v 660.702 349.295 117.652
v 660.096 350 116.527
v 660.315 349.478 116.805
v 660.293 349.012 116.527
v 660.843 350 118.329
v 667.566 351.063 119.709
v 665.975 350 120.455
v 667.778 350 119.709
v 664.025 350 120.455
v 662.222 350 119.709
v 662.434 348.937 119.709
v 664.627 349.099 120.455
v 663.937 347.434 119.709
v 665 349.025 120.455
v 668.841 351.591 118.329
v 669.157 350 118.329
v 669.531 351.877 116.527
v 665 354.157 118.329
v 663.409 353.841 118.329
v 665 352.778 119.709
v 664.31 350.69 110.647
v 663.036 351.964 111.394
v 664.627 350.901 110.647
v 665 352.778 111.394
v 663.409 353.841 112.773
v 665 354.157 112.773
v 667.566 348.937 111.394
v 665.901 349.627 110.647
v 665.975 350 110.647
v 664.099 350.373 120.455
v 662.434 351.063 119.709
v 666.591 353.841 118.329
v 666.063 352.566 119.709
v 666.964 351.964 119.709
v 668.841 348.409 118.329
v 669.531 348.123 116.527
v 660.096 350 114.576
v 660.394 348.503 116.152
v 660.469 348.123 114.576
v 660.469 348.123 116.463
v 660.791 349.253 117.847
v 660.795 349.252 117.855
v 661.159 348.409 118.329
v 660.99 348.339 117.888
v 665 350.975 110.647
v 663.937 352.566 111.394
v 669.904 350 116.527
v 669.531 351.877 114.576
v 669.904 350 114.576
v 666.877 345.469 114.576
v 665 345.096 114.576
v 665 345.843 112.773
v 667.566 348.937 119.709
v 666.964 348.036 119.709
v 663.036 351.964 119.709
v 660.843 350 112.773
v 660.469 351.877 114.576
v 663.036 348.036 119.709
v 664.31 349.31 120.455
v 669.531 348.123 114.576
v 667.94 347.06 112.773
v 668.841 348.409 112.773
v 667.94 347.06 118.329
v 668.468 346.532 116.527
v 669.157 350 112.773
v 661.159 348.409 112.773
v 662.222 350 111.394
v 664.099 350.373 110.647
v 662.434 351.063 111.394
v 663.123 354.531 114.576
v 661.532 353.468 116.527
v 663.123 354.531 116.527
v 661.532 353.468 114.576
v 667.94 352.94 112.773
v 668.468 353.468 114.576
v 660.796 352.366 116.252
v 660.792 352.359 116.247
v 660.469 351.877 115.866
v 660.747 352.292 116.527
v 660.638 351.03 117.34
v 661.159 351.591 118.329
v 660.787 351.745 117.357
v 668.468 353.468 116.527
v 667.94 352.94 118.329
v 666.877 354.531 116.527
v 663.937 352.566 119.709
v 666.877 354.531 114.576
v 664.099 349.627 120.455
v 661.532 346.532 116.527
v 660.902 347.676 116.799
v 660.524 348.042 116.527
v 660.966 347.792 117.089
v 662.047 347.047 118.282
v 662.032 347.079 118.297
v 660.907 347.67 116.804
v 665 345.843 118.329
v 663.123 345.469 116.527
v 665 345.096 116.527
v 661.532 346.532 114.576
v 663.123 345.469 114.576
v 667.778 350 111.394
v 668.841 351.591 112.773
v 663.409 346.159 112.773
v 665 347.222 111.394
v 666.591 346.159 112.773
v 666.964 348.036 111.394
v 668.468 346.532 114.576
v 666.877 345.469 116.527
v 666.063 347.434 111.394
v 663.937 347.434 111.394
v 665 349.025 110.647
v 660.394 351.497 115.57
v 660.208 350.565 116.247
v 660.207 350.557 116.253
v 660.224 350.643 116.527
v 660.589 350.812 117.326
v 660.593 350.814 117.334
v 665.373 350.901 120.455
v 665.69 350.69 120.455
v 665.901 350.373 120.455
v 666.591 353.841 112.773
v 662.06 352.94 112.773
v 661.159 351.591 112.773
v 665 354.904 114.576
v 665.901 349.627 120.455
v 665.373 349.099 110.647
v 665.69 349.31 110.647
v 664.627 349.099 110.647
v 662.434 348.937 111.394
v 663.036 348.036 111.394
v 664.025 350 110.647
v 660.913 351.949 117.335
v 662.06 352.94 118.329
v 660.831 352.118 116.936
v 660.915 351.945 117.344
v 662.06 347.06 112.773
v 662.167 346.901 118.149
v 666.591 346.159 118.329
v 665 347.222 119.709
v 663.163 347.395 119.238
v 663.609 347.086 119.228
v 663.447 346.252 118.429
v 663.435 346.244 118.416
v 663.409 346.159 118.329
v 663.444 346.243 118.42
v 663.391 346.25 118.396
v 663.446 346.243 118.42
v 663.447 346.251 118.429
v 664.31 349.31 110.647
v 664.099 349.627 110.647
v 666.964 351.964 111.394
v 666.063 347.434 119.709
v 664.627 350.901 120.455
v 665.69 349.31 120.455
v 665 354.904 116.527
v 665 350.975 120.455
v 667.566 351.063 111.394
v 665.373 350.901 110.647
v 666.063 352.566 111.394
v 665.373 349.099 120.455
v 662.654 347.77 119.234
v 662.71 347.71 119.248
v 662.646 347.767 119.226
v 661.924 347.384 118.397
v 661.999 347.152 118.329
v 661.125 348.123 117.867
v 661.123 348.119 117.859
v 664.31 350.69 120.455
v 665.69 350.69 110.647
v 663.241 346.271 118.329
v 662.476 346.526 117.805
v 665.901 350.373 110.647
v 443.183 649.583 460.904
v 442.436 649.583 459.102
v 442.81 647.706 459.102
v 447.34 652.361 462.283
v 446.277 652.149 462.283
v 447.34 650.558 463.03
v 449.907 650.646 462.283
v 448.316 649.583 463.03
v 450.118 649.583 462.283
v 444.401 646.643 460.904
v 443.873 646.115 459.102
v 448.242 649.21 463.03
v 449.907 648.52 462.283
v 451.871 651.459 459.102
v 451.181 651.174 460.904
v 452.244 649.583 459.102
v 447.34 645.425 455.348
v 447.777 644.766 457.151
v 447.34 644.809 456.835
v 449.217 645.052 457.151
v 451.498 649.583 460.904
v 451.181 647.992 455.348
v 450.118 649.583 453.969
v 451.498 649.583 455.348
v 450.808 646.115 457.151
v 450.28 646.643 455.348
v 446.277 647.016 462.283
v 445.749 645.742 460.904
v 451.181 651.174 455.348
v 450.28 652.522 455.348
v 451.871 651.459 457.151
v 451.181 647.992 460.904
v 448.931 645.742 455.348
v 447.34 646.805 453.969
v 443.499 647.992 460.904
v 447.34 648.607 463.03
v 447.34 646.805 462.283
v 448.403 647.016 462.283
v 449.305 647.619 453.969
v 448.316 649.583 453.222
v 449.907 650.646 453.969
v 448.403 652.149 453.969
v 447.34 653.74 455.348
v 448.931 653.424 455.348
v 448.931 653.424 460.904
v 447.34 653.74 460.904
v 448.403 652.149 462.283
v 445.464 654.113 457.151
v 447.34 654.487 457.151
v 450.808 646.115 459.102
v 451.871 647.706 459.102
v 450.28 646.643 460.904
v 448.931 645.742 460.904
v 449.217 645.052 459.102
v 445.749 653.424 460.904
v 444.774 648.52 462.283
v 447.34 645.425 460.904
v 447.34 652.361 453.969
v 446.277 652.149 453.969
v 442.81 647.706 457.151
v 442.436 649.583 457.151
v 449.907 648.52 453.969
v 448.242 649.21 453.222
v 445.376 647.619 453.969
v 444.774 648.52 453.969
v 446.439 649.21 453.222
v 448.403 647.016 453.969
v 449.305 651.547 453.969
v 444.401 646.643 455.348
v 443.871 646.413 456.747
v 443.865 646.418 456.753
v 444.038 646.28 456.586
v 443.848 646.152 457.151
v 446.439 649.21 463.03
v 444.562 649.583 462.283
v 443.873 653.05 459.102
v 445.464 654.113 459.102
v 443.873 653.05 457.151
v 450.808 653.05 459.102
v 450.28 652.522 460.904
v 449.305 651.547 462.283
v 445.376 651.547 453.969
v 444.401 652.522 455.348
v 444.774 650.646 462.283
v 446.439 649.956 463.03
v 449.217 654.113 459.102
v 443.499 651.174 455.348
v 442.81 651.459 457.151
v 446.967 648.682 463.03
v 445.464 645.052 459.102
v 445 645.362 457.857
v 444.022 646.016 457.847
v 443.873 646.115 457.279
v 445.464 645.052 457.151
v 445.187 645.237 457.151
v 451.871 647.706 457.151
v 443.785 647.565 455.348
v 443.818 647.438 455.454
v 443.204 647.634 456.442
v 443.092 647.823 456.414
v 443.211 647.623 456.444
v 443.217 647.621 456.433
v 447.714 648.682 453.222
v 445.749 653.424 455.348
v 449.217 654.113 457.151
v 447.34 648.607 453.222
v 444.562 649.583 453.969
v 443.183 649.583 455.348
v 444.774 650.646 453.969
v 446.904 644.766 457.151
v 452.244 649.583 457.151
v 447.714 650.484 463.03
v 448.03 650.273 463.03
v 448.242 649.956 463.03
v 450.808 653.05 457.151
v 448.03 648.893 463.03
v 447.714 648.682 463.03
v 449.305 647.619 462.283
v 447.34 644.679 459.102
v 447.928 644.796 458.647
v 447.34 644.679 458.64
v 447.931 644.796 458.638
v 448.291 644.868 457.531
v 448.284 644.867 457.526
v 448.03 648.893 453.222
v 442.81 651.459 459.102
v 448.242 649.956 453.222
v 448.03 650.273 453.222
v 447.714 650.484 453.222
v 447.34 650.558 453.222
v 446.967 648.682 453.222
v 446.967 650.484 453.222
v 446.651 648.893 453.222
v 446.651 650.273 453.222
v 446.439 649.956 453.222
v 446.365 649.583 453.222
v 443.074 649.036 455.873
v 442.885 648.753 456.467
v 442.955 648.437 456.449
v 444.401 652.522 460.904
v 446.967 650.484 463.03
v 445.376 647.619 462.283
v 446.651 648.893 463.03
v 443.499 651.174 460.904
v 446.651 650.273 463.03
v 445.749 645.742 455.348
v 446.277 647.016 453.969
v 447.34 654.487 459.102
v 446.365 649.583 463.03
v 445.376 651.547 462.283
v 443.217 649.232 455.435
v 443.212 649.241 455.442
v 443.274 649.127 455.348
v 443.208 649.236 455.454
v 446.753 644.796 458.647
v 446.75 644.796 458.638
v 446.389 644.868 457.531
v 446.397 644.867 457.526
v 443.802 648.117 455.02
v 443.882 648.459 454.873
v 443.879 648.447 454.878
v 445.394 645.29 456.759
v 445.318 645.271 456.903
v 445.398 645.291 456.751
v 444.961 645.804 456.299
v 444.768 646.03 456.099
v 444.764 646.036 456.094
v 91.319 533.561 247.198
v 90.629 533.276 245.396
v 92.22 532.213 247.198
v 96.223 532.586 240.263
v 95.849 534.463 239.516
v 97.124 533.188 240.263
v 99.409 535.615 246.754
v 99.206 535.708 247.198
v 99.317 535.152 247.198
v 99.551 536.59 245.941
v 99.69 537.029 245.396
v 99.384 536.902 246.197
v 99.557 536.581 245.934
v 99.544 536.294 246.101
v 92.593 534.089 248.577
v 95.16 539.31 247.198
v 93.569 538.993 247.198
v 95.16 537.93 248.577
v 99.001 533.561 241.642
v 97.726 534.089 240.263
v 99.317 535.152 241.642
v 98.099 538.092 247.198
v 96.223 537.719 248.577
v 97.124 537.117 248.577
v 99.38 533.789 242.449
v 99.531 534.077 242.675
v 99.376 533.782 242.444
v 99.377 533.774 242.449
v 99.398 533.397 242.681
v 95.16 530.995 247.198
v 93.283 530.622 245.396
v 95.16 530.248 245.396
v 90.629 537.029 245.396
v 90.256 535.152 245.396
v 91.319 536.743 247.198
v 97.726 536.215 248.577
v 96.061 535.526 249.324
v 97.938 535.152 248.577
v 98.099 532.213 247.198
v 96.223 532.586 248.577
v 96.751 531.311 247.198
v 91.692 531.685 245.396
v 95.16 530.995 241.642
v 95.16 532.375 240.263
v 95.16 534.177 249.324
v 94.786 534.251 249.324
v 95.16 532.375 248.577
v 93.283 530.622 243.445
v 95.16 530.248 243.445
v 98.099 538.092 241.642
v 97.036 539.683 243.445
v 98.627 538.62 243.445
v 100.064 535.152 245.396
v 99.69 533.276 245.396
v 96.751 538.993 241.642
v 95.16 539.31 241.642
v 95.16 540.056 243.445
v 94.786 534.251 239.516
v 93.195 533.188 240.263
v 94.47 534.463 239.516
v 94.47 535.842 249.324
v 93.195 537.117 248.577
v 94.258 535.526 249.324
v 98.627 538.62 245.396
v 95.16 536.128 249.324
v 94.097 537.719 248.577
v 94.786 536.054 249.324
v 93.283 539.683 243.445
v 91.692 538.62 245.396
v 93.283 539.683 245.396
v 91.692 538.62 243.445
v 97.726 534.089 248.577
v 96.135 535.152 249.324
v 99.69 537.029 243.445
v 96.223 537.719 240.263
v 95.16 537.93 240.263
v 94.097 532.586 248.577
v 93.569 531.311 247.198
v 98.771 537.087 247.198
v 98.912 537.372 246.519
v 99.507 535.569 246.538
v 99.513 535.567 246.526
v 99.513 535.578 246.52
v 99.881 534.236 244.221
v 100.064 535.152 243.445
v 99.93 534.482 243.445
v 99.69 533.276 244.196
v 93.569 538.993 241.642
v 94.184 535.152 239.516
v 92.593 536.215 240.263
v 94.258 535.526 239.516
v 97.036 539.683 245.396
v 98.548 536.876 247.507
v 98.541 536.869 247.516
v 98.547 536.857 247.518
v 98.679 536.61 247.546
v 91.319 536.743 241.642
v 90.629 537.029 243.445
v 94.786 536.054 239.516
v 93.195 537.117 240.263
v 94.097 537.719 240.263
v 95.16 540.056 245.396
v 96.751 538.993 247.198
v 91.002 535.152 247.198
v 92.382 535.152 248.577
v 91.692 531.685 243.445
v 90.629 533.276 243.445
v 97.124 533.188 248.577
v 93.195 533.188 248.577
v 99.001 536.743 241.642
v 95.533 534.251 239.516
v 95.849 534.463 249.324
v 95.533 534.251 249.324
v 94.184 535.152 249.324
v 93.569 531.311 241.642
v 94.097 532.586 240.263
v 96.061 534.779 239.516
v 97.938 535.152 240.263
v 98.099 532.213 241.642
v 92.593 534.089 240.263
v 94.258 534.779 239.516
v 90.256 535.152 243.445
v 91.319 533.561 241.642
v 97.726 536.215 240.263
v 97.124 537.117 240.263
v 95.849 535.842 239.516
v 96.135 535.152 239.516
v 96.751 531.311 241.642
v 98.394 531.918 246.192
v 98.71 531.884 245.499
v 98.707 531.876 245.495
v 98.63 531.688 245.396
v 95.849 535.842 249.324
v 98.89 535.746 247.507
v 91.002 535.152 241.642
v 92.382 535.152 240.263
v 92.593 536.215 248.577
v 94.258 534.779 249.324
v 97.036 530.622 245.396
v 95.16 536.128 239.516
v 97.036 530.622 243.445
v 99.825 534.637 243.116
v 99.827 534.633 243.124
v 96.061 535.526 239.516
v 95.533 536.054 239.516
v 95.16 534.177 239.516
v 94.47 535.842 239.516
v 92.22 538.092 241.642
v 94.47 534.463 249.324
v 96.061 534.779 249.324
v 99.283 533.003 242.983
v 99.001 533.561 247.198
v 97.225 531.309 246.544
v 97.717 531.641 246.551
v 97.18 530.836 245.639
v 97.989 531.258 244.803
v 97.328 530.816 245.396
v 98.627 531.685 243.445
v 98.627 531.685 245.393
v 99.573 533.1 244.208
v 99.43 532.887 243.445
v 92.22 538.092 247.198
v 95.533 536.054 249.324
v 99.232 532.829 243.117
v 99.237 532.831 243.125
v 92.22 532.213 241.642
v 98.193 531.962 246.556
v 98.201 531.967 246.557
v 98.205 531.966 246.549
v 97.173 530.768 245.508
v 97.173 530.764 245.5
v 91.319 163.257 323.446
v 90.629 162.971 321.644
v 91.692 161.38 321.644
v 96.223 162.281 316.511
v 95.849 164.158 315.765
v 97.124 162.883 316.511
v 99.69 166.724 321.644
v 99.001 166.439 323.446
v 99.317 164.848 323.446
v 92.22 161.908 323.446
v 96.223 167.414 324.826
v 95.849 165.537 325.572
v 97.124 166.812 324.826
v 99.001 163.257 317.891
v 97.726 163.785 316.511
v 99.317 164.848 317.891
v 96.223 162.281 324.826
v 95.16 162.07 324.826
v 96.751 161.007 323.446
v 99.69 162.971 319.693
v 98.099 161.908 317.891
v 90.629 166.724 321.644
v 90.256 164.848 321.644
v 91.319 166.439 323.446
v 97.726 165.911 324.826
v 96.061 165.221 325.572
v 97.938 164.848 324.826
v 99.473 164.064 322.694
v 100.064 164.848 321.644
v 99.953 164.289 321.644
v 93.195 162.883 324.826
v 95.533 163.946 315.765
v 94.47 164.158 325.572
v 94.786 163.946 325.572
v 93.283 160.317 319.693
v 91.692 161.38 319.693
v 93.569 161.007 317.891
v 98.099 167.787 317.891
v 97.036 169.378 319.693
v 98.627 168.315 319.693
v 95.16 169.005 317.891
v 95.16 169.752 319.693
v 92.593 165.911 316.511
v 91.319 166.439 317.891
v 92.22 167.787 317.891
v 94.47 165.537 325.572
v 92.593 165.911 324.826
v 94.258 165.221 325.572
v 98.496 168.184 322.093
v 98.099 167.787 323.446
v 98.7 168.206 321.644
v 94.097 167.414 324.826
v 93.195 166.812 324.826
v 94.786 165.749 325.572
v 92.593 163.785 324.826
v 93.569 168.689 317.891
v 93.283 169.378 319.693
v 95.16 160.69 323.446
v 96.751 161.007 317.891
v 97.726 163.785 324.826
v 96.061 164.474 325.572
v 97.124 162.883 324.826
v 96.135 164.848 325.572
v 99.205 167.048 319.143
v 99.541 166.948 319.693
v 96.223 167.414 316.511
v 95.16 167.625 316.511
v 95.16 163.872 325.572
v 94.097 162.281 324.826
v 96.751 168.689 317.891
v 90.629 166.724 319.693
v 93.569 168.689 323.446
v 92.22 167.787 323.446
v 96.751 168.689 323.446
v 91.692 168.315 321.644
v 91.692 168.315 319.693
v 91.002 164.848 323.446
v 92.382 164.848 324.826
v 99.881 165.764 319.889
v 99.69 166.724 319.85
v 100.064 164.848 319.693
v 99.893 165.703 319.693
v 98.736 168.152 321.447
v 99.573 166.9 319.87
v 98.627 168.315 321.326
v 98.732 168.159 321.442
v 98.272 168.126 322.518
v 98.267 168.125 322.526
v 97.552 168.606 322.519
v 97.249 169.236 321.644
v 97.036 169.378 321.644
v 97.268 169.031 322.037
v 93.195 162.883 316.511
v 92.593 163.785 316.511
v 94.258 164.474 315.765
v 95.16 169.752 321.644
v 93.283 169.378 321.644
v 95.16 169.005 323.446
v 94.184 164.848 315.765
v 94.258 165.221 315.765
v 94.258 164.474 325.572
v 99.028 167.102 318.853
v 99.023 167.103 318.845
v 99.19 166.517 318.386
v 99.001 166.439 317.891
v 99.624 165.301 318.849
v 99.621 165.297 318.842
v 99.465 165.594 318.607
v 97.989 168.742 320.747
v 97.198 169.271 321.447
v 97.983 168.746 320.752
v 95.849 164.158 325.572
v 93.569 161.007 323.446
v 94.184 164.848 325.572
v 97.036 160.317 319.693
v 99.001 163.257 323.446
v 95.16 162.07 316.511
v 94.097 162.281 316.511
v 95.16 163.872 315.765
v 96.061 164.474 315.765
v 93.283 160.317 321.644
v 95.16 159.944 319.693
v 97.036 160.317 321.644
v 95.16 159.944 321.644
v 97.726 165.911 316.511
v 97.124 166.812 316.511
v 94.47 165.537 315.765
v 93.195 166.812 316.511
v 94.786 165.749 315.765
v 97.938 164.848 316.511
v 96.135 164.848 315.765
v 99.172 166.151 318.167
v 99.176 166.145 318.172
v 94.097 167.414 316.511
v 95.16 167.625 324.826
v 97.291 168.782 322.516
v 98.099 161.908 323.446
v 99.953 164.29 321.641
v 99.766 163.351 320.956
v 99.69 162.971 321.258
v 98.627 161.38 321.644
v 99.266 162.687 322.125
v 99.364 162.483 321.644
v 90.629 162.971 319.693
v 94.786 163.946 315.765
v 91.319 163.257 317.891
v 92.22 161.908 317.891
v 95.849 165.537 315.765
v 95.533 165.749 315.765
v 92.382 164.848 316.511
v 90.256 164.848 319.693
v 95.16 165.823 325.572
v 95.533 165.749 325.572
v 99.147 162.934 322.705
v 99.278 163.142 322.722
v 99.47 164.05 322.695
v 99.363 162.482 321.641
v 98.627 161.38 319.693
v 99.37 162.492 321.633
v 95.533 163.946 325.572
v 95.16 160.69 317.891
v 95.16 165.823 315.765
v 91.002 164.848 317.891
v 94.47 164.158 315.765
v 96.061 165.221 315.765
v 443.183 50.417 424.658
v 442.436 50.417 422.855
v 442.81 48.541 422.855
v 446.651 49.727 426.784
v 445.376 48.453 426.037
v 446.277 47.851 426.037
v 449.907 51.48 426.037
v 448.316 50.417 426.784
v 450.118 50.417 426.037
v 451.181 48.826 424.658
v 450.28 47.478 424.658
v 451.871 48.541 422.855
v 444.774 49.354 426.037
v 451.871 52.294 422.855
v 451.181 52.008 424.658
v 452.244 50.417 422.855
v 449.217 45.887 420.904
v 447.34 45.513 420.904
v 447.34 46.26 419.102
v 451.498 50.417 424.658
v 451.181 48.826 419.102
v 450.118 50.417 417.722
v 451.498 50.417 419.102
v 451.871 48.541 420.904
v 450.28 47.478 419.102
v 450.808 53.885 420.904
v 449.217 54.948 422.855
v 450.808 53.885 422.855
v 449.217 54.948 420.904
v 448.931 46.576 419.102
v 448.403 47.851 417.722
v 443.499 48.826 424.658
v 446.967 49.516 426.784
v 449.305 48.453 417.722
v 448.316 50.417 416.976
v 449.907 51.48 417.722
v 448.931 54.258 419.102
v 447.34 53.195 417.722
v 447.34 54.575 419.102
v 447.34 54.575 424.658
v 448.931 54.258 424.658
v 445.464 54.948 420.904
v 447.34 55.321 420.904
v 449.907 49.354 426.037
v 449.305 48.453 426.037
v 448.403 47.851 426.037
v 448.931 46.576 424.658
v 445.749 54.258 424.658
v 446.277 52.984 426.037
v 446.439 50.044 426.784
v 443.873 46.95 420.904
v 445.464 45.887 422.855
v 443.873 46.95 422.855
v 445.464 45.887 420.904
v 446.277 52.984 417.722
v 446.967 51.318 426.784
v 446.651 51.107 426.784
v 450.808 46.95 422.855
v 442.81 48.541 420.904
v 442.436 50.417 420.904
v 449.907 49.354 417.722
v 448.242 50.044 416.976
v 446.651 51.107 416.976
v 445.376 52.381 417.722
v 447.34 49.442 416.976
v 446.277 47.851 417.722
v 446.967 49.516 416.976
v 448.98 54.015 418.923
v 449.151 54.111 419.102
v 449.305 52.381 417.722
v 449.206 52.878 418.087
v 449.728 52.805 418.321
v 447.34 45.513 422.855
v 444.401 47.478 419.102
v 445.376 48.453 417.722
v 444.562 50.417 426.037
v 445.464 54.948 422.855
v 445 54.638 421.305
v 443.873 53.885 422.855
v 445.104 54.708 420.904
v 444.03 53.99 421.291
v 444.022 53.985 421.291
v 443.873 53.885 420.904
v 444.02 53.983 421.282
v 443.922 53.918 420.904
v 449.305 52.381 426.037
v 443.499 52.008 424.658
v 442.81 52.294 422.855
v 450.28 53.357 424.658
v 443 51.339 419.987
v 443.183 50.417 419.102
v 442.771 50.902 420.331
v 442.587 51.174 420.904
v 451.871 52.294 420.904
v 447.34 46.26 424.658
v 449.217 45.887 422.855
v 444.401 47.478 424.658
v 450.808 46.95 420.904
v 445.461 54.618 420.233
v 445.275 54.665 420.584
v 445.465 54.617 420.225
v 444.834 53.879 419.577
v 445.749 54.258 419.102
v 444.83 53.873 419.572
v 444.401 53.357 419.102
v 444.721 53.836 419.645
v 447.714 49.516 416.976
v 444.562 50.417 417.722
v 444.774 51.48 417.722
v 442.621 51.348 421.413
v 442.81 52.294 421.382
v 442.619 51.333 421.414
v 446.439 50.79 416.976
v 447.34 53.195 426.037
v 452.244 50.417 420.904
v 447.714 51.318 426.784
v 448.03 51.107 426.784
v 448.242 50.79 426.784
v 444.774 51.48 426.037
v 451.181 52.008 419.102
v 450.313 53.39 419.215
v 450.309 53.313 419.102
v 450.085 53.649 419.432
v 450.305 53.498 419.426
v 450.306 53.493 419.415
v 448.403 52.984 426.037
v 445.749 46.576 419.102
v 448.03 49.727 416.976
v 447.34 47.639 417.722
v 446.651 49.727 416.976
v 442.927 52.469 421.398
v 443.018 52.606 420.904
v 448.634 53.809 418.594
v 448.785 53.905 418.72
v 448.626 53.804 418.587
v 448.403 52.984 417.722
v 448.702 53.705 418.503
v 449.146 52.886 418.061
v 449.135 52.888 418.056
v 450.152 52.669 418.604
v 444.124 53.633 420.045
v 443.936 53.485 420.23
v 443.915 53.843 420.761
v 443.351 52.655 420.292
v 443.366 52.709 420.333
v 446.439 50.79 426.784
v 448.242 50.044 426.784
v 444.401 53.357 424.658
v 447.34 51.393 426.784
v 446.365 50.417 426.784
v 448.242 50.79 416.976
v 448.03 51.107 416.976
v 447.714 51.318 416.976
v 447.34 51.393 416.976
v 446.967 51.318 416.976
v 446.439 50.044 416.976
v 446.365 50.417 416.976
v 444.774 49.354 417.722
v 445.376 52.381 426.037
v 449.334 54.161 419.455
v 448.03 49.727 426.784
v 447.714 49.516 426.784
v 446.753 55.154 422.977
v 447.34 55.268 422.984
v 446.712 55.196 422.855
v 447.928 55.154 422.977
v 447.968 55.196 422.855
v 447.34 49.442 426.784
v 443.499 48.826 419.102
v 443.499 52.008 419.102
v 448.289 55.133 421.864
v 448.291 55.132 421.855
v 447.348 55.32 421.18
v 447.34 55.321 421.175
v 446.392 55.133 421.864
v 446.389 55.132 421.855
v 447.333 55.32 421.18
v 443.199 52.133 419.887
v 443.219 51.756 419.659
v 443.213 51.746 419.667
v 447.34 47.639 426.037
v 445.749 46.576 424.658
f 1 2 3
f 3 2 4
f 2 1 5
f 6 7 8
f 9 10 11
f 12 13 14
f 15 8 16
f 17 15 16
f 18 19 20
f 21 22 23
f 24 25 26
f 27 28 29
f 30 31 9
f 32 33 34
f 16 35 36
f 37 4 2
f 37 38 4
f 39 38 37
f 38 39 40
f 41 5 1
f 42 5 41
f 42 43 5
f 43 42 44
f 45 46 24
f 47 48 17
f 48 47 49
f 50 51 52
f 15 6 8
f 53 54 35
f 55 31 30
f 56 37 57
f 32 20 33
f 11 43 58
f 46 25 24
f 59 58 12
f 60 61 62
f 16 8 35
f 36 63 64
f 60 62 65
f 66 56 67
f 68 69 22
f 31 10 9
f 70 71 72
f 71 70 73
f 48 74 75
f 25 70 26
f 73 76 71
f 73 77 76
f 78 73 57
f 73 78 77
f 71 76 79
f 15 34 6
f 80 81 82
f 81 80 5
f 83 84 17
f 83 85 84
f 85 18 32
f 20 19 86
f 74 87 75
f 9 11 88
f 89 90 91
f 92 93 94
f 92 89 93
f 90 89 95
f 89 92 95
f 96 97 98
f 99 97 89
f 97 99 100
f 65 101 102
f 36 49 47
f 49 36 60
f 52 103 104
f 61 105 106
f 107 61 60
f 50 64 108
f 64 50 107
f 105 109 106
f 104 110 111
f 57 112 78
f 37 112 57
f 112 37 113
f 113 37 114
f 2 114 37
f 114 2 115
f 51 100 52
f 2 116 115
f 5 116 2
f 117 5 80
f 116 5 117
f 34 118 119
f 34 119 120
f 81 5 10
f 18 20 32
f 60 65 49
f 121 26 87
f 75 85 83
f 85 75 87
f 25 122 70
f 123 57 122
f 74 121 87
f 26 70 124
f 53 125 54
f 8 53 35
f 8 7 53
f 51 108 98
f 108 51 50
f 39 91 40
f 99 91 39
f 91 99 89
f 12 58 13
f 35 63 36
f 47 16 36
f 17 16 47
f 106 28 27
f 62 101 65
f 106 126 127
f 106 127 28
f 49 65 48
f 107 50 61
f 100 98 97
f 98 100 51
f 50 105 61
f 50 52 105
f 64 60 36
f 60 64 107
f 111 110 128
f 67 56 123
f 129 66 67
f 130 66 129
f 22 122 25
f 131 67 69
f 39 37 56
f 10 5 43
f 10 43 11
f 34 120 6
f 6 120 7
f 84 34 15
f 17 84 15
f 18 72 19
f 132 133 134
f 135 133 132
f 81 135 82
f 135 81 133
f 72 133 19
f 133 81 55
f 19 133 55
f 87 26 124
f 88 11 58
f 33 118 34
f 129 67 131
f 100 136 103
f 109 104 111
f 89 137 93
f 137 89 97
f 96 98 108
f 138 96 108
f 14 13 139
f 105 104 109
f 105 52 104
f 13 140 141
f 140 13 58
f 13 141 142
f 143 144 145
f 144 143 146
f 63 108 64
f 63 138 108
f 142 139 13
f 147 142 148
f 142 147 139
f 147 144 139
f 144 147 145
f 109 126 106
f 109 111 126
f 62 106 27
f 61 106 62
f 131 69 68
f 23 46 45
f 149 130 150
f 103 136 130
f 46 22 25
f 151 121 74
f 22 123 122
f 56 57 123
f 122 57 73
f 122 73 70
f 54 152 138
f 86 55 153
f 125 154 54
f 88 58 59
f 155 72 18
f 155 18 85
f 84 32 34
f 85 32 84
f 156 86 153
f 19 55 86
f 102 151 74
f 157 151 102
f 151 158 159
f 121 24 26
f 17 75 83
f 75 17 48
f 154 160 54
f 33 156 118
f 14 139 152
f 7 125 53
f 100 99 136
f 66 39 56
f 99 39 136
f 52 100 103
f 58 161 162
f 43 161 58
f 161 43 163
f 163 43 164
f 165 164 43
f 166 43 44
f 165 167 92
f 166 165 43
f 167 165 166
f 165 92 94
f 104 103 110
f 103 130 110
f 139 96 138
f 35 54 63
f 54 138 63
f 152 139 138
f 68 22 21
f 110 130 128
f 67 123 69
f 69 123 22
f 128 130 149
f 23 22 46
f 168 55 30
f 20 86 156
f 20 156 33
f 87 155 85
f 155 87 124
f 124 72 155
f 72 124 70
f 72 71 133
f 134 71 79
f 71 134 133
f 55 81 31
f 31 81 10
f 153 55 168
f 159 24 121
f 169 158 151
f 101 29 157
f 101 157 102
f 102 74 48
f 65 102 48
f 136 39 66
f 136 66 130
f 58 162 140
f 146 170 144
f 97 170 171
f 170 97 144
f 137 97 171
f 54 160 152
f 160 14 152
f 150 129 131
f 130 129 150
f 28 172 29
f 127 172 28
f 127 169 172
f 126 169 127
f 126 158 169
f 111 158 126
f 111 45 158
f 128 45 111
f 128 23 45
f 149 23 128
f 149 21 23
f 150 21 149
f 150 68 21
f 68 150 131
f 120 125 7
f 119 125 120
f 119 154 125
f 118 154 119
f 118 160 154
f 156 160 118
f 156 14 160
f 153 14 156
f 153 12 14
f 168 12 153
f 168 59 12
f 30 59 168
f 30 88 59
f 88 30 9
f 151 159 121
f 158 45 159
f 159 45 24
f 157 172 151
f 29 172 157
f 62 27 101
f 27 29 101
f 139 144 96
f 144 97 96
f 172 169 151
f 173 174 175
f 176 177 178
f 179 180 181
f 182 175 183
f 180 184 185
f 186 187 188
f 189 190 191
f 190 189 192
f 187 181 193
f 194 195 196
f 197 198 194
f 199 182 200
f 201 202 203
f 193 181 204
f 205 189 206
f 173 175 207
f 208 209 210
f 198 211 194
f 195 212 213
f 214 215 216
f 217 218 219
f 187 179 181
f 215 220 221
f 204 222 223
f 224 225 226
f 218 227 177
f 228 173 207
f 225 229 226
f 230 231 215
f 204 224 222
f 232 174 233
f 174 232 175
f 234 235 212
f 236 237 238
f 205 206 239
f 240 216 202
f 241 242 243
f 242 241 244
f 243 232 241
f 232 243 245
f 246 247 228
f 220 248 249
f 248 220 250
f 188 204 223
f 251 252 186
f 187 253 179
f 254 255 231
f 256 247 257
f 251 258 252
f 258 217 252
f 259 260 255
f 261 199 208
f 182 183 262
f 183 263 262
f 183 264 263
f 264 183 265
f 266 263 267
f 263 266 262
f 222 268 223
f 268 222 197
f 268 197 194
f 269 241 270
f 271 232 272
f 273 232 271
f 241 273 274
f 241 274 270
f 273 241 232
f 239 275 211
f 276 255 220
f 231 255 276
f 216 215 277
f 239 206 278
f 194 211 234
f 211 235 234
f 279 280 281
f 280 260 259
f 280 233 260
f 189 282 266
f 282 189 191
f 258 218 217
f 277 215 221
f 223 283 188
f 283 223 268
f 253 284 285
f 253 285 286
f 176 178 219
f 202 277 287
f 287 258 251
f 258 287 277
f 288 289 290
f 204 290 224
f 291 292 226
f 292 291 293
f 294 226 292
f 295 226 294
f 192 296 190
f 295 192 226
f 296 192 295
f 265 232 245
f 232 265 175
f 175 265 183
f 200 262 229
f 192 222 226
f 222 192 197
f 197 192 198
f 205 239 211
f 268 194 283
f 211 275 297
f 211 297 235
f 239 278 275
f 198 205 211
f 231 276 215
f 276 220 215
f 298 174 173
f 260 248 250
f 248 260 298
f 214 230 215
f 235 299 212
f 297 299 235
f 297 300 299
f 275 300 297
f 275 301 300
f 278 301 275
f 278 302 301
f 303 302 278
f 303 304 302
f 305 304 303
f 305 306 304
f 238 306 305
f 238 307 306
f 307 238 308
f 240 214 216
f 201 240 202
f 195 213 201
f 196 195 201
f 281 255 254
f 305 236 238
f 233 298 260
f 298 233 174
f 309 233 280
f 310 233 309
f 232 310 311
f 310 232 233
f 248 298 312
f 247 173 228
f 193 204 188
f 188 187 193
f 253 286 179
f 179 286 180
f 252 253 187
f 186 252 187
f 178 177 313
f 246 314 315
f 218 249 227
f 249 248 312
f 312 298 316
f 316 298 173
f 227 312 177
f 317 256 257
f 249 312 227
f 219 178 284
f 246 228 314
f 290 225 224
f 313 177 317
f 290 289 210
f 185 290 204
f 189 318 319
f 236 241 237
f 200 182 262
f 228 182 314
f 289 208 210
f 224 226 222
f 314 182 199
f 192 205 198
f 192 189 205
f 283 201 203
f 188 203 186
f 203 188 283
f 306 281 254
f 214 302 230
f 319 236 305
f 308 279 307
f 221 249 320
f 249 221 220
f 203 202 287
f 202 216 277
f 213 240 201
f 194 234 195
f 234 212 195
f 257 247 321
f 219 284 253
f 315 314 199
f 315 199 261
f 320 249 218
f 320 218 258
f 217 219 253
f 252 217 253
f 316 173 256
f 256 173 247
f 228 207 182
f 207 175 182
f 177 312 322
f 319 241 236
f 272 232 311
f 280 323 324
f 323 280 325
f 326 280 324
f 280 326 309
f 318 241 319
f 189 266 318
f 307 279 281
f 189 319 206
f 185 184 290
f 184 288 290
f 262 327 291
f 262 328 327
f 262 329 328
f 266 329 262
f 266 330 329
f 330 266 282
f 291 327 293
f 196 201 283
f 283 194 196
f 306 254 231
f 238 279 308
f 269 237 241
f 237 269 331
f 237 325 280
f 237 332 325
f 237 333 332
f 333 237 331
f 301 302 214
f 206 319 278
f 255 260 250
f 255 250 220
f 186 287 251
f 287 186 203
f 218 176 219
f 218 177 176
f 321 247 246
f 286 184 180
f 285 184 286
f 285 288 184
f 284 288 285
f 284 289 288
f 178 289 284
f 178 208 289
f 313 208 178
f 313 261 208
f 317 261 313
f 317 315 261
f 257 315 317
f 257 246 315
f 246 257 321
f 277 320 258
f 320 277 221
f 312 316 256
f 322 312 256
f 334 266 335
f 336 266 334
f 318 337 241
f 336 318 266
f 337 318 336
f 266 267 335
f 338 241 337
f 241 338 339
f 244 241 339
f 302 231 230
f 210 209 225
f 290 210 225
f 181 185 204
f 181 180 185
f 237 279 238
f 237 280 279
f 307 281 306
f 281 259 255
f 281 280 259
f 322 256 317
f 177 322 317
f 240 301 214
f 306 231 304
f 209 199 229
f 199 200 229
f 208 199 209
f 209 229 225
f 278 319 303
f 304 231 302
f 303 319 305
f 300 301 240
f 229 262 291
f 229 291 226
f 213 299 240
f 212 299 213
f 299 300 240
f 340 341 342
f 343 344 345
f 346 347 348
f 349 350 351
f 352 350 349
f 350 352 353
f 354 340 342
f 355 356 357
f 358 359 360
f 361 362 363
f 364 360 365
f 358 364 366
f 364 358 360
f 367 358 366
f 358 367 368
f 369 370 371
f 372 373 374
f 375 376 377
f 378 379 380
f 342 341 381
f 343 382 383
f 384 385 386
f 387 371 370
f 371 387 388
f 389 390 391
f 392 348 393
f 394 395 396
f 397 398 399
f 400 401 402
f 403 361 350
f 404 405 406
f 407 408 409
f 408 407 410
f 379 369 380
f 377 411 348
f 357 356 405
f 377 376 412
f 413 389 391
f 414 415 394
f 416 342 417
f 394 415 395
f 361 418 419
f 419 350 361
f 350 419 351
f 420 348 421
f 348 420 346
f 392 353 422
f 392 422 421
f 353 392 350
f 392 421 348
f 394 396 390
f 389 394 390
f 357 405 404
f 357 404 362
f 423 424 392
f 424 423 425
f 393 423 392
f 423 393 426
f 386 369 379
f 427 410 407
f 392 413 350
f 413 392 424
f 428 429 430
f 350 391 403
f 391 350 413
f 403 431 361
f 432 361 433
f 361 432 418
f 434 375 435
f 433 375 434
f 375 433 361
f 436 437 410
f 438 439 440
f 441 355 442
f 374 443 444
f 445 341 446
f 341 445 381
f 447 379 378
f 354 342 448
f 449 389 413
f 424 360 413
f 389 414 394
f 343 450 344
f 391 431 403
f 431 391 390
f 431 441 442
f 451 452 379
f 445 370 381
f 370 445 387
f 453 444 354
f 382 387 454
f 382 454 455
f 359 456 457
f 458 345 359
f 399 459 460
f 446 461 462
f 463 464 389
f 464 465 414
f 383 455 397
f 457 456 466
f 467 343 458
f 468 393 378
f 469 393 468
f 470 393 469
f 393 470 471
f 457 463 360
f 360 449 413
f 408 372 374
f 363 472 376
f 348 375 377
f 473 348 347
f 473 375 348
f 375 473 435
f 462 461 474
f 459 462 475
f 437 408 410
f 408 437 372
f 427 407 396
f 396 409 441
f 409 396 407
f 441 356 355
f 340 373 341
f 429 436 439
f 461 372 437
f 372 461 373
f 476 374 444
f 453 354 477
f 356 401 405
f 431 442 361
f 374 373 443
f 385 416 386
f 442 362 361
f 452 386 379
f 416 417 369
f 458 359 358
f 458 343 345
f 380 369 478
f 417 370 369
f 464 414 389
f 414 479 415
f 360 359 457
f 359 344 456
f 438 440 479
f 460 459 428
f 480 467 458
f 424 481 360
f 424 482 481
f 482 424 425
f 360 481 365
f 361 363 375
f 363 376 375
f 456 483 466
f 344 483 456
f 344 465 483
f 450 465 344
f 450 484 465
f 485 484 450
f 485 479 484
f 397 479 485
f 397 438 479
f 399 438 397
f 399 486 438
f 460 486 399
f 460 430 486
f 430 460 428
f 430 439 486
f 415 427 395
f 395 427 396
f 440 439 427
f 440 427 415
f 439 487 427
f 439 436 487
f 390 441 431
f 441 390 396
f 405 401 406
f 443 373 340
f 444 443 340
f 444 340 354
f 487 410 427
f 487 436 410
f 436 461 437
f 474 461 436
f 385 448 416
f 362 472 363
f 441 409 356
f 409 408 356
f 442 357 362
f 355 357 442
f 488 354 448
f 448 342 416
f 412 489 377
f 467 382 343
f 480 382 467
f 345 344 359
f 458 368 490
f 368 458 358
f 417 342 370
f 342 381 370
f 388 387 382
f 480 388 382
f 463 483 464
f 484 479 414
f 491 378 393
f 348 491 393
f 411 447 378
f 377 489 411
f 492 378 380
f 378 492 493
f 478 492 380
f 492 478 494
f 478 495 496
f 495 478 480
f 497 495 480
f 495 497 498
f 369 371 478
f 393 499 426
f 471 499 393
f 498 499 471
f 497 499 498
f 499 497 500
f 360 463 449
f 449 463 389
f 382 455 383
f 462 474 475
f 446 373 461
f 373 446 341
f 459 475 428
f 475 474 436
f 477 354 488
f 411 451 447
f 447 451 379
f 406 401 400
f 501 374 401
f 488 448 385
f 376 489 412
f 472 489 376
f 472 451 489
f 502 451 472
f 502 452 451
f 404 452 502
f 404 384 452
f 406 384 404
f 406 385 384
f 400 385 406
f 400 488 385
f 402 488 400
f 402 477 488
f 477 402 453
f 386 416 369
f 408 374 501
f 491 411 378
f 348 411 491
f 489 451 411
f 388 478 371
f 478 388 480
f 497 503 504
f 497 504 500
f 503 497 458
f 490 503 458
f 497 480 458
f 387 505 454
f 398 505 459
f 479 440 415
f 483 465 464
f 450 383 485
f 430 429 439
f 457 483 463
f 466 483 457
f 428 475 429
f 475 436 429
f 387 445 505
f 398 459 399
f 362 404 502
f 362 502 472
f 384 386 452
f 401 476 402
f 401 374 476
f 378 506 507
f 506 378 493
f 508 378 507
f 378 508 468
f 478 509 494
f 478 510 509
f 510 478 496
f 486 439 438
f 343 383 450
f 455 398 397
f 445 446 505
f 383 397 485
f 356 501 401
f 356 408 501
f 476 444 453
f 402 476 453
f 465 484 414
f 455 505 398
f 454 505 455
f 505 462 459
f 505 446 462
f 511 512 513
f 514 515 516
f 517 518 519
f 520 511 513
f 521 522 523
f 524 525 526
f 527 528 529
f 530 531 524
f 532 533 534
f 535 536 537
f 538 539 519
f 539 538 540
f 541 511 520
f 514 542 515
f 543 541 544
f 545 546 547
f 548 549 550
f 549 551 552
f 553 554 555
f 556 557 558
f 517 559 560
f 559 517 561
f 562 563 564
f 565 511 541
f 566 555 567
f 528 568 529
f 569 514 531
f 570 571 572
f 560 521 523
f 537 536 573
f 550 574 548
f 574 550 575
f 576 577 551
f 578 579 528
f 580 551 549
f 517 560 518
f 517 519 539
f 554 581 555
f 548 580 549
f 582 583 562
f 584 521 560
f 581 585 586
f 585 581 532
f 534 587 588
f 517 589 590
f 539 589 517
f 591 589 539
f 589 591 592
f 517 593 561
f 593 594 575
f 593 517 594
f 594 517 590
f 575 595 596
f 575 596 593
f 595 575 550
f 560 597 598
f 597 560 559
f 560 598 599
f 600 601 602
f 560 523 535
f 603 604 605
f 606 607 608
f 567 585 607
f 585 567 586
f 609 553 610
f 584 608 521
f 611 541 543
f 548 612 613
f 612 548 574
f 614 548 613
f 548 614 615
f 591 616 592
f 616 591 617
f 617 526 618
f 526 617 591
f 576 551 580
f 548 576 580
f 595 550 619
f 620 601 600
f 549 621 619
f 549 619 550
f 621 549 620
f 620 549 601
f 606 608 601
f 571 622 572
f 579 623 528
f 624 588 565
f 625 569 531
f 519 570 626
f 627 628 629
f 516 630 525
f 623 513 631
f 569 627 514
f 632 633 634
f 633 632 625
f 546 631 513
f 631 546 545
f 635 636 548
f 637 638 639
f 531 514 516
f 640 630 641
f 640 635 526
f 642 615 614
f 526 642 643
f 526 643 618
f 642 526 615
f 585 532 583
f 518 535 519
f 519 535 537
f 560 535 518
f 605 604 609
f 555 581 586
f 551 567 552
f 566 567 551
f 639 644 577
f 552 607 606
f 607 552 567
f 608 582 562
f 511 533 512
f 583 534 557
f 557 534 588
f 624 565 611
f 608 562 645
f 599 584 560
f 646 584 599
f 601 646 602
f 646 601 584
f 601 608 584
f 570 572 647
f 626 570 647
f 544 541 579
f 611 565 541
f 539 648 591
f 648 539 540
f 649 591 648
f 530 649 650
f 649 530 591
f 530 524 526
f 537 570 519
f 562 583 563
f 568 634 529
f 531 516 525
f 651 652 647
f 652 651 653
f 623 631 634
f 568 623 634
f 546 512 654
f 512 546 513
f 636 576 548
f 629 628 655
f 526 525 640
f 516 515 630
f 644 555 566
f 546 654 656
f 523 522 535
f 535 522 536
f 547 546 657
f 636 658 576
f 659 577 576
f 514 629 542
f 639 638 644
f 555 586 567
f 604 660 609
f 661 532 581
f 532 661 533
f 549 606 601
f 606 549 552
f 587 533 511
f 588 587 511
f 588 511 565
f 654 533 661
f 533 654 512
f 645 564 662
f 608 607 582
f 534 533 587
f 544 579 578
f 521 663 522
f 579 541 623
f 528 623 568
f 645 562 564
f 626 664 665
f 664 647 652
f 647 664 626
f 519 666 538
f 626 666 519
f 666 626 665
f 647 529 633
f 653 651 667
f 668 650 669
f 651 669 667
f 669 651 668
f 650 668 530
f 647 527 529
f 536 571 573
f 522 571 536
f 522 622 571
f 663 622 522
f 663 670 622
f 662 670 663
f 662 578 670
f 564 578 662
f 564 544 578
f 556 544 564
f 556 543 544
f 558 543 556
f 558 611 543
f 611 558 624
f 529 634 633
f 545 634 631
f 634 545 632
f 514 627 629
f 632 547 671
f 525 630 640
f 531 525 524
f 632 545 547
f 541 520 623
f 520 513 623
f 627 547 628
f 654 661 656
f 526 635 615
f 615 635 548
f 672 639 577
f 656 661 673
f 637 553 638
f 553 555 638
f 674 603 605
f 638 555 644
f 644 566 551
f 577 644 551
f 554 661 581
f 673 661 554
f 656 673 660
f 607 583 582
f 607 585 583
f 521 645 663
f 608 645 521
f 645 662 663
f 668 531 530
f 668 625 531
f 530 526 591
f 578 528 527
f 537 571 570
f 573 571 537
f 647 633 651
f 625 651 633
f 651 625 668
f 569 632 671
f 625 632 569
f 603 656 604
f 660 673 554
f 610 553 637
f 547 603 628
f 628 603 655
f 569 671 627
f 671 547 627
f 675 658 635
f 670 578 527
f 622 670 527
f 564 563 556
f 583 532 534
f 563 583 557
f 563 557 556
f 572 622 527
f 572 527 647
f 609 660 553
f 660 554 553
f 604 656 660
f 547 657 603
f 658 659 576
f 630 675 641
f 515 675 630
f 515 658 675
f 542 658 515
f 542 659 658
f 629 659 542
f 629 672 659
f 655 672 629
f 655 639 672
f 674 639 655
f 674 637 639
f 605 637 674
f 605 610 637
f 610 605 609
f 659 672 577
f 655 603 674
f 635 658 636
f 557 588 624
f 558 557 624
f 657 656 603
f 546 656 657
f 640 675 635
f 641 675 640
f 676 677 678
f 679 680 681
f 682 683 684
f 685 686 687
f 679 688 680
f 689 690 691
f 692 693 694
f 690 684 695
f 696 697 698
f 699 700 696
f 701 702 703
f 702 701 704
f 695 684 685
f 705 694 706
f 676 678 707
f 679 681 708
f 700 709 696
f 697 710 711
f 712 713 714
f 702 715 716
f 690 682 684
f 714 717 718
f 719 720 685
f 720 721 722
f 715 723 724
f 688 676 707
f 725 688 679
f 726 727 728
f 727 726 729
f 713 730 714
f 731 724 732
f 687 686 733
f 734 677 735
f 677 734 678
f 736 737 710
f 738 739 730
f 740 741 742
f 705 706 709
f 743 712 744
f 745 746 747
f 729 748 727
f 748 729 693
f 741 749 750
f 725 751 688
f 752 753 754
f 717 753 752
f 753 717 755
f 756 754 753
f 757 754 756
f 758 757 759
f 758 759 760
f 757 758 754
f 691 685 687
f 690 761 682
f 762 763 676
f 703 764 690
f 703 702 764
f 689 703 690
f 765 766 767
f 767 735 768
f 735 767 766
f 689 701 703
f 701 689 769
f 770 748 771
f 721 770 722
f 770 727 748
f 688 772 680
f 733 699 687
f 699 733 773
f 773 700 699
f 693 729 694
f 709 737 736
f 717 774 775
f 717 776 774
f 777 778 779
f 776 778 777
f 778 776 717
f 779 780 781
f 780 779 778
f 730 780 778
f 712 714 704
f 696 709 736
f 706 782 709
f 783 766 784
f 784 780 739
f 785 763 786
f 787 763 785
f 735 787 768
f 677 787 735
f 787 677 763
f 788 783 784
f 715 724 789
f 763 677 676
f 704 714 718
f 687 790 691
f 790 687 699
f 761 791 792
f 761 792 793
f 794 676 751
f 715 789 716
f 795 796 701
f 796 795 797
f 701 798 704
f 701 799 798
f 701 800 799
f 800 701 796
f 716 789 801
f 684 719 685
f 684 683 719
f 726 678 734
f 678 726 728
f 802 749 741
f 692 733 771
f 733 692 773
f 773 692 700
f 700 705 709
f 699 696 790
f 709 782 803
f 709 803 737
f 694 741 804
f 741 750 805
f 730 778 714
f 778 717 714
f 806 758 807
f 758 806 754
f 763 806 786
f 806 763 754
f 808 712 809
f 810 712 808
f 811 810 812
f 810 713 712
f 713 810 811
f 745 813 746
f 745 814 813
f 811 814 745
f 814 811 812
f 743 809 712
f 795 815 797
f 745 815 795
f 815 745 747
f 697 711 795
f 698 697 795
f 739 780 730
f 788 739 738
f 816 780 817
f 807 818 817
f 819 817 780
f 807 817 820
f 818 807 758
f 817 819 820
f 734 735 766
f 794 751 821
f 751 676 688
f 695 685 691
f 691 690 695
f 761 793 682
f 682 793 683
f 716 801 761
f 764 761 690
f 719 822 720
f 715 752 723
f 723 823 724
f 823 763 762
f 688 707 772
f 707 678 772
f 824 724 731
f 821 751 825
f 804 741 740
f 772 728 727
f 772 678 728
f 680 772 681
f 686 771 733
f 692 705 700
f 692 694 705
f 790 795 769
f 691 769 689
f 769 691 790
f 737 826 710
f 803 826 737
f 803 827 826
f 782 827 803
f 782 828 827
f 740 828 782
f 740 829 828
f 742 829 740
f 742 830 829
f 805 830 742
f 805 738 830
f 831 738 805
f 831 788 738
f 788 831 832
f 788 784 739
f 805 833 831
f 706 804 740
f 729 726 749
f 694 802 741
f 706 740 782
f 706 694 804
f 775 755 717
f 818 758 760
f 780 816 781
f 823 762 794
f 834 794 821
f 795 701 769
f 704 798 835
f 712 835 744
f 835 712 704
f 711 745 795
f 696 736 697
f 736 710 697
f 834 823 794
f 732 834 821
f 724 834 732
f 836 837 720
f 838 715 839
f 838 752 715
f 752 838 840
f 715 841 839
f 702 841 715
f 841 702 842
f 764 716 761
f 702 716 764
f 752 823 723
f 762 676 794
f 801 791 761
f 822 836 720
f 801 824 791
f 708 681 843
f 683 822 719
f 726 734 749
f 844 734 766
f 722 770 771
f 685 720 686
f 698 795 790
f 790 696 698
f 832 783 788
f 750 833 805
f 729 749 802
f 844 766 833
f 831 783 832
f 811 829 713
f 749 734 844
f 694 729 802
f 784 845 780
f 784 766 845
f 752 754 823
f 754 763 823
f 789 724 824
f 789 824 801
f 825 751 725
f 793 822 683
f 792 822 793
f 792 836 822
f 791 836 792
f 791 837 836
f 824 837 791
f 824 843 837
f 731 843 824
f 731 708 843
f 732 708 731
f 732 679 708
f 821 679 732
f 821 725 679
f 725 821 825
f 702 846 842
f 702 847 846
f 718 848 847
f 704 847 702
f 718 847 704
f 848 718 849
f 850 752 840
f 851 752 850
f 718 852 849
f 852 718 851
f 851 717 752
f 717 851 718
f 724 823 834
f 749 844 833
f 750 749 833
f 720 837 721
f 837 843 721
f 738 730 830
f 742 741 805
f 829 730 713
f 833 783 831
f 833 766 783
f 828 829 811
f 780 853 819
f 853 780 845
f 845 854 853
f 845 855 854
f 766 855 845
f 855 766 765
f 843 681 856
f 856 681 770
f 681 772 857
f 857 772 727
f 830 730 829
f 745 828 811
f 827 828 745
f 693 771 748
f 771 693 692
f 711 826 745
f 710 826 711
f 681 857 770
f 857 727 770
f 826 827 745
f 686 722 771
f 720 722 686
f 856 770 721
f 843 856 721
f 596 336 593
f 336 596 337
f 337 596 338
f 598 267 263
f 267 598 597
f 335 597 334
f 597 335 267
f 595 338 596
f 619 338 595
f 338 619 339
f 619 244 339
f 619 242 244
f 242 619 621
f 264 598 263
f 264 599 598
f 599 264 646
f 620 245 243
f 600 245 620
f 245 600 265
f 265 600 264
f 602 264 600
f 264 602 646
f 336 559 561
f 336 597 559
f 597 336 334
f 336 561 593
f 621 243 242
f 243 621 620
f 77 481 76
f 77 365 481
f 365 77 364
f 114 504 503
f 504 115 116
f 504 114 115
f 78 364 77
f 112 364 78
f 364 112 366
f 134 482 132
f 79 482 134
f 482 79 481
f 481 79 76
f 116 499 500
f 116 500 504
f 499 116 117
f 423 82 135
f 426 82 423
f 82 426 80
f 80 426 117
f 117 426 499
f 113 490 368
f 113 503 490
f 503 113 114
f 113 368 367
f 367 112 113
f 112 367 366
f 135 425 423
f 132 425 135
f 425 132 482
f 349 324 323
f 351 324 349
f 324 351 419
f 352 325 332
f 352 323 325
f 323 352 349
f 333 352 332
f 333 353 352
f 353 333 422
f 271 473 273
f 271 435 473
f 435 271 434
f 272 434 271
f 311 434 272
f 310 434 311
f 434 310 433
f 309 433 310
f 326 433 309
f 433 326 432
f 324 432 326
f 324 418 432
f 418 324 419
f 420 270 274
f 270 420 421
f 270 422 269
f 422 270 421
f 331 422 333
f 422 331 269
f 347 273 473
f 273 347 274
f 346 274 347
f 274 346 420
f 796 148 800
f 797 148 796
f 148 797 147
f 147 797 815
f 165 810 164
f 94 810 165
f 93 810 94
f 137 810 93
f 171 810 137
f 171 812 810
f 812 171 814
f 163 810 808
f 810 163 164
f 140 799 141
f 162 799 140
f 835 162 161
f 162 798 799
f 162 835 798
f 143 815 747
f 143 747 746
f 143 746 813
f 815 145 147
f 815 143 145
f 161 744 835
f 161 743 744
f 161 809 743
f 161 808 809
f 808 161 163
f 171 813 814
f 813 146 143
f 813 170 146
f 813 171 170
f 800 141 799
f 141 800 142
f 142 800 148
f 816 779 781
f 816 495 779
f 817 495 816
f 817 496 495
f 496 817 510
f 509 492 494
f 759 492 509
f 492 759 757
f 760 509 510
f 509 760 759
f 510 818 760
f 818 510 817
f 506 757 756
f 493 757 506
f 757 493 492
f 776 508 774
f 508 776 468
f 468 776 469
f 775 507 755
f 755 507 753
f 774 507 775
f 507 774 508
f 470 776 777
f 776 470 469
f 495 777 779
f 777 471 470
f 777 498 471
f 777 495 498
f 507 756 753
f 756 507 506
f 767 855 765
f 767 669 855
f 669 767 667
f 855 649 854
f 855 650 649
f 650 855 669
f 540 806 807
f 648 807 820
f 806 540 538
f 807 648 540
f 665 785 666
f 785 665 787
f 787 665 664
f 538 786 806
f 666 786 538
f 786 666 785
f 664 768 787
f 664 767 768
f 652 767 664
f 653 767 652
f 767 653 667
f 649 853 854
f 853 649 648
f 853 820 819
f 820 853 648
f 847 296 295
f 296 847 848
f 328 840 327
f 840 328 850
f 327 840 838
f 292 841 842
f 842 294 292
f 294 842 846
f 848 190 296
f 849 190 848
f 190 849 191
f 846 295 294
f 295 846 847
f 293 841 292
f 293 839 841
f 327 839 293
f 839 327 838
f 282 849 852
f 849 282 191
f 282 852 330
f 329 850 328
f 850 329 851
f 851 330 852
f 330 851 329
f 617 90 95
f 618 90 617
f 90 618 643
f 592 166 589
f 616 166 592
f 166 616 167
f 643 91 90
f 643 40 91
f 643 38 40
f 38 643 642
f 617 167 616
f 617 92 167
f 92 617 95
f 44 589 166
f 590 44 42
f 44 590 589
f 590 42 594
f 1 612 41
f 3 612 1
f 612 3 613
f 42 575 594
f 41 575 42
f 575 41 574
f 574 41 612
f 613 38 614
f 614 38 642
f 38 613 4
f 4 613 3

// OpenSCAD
// Define the node renderer.
//  Parameters:
//  n - the index in the nodes table of the node to render
module renderNode(n) {
    translate(nodeCoordinates[n]) sphere(r = 5, center = true);
};

// Define the edge renderer.
//  Parameters:
//  src - the index in the nodes table of the source node
//  dst - the index in the nodes table of the destination node
module renderEdge(src, dst) {

    // Find the source and destination node coordinates.
    srcNode  = nodeCoordinates[src];
    destNode = nodeCoordinates[dst];

    // Find the vector connecting the source and destination node coordinates.
	diff = [destNode[0] - srcNode[0], destNode[1] - srcNode[1], destNode[2] - srcNode[2]];

    // Find the distance between the source and destination node coordinates.
	length = sqrt(pow(diff[0], 2) + pow(diff[1], 2) + pow(diff[2], 2));

    // Move to the starting point.
	translate(diff / 2 + srcNode) {

        // Rotate around the Z axis.
        rotate([0, 0, atan2(diff[1], diff[0])]) {

            // Rotate around the Y axis.
            rotate([0, atan2(sqrt(pow(diff[0], 2) + pow(diff[1], 2)), diff[2]), 0]) {

                // Draw the edge.
                cylinder(h = length, r = 1.0, center = true);

            }

        }

    }

};

// Define the list of node coordinates.
nodeCoordinates = [
[665.0, 350.0, 115.55123658929773], 
[447.3403532281084, 649.5828026329734, 458.12608176178617], 
[95.1596467718916, 535.1523544721291, 244.42013822996074], 
[95.15964677189154, 164.847645527871, 320.6684697845816], 
[447.34035322810837, 50.417197367026574, 421.8797364660057]
];

// Define the list of node identifiers.
nodeIdentifiers = [
[0, 0], 
[1, 1], 
[2, 2], 
[3, 3], 
[4, 4]
];

// Define the list of edges.
edgeIdentifiers = [
[1, 1, 1], 
[2, 1, 3], 
[3, 2, 0], 
[4, 2, 1], 
[5, 3, 1], 
[6, 3, 3], 
[7, 4, 0], 
[8, 4, 2], 
[9, 4, 3], 
[10, 4, 4], 
[11, 1, 1], 
[12, 1, 3], 
[13, 1, 4], 
[14, 2, 0], 
[15, 2, 2], 
[16, 2, 4], 
[17, 3, 1], 
[18, 3, 3], 
[19, 0, 0], 
[20, 0, 3], 
[21, 1, 2], 
[22, 1, 4], 
[23, 2, 0], 
[24, 2, 4], 
[25, 3, 0], 
[26, 3, 1], 
[27, 3, 3], 
[28, 3, 4], 
[29, 4, 1], 
[30, 4, 4]
];

// Render the network nodes.
for (nodeIndex = [0 : len(nodeCoordinates) - 1] ) {
renderNode(nodeIndex);
};

// Render the network edges.
for (edgeIndex = [0 : len(edgeIdentifiers) - 1] ) {
renderEdge(
    lookup(edgeIdentifiers[edgeIndex][1], nodeIdentifiers),
    lookup(edgeIdentifiers[edgeIndex][2], nodeIdentifiers)
);
};
